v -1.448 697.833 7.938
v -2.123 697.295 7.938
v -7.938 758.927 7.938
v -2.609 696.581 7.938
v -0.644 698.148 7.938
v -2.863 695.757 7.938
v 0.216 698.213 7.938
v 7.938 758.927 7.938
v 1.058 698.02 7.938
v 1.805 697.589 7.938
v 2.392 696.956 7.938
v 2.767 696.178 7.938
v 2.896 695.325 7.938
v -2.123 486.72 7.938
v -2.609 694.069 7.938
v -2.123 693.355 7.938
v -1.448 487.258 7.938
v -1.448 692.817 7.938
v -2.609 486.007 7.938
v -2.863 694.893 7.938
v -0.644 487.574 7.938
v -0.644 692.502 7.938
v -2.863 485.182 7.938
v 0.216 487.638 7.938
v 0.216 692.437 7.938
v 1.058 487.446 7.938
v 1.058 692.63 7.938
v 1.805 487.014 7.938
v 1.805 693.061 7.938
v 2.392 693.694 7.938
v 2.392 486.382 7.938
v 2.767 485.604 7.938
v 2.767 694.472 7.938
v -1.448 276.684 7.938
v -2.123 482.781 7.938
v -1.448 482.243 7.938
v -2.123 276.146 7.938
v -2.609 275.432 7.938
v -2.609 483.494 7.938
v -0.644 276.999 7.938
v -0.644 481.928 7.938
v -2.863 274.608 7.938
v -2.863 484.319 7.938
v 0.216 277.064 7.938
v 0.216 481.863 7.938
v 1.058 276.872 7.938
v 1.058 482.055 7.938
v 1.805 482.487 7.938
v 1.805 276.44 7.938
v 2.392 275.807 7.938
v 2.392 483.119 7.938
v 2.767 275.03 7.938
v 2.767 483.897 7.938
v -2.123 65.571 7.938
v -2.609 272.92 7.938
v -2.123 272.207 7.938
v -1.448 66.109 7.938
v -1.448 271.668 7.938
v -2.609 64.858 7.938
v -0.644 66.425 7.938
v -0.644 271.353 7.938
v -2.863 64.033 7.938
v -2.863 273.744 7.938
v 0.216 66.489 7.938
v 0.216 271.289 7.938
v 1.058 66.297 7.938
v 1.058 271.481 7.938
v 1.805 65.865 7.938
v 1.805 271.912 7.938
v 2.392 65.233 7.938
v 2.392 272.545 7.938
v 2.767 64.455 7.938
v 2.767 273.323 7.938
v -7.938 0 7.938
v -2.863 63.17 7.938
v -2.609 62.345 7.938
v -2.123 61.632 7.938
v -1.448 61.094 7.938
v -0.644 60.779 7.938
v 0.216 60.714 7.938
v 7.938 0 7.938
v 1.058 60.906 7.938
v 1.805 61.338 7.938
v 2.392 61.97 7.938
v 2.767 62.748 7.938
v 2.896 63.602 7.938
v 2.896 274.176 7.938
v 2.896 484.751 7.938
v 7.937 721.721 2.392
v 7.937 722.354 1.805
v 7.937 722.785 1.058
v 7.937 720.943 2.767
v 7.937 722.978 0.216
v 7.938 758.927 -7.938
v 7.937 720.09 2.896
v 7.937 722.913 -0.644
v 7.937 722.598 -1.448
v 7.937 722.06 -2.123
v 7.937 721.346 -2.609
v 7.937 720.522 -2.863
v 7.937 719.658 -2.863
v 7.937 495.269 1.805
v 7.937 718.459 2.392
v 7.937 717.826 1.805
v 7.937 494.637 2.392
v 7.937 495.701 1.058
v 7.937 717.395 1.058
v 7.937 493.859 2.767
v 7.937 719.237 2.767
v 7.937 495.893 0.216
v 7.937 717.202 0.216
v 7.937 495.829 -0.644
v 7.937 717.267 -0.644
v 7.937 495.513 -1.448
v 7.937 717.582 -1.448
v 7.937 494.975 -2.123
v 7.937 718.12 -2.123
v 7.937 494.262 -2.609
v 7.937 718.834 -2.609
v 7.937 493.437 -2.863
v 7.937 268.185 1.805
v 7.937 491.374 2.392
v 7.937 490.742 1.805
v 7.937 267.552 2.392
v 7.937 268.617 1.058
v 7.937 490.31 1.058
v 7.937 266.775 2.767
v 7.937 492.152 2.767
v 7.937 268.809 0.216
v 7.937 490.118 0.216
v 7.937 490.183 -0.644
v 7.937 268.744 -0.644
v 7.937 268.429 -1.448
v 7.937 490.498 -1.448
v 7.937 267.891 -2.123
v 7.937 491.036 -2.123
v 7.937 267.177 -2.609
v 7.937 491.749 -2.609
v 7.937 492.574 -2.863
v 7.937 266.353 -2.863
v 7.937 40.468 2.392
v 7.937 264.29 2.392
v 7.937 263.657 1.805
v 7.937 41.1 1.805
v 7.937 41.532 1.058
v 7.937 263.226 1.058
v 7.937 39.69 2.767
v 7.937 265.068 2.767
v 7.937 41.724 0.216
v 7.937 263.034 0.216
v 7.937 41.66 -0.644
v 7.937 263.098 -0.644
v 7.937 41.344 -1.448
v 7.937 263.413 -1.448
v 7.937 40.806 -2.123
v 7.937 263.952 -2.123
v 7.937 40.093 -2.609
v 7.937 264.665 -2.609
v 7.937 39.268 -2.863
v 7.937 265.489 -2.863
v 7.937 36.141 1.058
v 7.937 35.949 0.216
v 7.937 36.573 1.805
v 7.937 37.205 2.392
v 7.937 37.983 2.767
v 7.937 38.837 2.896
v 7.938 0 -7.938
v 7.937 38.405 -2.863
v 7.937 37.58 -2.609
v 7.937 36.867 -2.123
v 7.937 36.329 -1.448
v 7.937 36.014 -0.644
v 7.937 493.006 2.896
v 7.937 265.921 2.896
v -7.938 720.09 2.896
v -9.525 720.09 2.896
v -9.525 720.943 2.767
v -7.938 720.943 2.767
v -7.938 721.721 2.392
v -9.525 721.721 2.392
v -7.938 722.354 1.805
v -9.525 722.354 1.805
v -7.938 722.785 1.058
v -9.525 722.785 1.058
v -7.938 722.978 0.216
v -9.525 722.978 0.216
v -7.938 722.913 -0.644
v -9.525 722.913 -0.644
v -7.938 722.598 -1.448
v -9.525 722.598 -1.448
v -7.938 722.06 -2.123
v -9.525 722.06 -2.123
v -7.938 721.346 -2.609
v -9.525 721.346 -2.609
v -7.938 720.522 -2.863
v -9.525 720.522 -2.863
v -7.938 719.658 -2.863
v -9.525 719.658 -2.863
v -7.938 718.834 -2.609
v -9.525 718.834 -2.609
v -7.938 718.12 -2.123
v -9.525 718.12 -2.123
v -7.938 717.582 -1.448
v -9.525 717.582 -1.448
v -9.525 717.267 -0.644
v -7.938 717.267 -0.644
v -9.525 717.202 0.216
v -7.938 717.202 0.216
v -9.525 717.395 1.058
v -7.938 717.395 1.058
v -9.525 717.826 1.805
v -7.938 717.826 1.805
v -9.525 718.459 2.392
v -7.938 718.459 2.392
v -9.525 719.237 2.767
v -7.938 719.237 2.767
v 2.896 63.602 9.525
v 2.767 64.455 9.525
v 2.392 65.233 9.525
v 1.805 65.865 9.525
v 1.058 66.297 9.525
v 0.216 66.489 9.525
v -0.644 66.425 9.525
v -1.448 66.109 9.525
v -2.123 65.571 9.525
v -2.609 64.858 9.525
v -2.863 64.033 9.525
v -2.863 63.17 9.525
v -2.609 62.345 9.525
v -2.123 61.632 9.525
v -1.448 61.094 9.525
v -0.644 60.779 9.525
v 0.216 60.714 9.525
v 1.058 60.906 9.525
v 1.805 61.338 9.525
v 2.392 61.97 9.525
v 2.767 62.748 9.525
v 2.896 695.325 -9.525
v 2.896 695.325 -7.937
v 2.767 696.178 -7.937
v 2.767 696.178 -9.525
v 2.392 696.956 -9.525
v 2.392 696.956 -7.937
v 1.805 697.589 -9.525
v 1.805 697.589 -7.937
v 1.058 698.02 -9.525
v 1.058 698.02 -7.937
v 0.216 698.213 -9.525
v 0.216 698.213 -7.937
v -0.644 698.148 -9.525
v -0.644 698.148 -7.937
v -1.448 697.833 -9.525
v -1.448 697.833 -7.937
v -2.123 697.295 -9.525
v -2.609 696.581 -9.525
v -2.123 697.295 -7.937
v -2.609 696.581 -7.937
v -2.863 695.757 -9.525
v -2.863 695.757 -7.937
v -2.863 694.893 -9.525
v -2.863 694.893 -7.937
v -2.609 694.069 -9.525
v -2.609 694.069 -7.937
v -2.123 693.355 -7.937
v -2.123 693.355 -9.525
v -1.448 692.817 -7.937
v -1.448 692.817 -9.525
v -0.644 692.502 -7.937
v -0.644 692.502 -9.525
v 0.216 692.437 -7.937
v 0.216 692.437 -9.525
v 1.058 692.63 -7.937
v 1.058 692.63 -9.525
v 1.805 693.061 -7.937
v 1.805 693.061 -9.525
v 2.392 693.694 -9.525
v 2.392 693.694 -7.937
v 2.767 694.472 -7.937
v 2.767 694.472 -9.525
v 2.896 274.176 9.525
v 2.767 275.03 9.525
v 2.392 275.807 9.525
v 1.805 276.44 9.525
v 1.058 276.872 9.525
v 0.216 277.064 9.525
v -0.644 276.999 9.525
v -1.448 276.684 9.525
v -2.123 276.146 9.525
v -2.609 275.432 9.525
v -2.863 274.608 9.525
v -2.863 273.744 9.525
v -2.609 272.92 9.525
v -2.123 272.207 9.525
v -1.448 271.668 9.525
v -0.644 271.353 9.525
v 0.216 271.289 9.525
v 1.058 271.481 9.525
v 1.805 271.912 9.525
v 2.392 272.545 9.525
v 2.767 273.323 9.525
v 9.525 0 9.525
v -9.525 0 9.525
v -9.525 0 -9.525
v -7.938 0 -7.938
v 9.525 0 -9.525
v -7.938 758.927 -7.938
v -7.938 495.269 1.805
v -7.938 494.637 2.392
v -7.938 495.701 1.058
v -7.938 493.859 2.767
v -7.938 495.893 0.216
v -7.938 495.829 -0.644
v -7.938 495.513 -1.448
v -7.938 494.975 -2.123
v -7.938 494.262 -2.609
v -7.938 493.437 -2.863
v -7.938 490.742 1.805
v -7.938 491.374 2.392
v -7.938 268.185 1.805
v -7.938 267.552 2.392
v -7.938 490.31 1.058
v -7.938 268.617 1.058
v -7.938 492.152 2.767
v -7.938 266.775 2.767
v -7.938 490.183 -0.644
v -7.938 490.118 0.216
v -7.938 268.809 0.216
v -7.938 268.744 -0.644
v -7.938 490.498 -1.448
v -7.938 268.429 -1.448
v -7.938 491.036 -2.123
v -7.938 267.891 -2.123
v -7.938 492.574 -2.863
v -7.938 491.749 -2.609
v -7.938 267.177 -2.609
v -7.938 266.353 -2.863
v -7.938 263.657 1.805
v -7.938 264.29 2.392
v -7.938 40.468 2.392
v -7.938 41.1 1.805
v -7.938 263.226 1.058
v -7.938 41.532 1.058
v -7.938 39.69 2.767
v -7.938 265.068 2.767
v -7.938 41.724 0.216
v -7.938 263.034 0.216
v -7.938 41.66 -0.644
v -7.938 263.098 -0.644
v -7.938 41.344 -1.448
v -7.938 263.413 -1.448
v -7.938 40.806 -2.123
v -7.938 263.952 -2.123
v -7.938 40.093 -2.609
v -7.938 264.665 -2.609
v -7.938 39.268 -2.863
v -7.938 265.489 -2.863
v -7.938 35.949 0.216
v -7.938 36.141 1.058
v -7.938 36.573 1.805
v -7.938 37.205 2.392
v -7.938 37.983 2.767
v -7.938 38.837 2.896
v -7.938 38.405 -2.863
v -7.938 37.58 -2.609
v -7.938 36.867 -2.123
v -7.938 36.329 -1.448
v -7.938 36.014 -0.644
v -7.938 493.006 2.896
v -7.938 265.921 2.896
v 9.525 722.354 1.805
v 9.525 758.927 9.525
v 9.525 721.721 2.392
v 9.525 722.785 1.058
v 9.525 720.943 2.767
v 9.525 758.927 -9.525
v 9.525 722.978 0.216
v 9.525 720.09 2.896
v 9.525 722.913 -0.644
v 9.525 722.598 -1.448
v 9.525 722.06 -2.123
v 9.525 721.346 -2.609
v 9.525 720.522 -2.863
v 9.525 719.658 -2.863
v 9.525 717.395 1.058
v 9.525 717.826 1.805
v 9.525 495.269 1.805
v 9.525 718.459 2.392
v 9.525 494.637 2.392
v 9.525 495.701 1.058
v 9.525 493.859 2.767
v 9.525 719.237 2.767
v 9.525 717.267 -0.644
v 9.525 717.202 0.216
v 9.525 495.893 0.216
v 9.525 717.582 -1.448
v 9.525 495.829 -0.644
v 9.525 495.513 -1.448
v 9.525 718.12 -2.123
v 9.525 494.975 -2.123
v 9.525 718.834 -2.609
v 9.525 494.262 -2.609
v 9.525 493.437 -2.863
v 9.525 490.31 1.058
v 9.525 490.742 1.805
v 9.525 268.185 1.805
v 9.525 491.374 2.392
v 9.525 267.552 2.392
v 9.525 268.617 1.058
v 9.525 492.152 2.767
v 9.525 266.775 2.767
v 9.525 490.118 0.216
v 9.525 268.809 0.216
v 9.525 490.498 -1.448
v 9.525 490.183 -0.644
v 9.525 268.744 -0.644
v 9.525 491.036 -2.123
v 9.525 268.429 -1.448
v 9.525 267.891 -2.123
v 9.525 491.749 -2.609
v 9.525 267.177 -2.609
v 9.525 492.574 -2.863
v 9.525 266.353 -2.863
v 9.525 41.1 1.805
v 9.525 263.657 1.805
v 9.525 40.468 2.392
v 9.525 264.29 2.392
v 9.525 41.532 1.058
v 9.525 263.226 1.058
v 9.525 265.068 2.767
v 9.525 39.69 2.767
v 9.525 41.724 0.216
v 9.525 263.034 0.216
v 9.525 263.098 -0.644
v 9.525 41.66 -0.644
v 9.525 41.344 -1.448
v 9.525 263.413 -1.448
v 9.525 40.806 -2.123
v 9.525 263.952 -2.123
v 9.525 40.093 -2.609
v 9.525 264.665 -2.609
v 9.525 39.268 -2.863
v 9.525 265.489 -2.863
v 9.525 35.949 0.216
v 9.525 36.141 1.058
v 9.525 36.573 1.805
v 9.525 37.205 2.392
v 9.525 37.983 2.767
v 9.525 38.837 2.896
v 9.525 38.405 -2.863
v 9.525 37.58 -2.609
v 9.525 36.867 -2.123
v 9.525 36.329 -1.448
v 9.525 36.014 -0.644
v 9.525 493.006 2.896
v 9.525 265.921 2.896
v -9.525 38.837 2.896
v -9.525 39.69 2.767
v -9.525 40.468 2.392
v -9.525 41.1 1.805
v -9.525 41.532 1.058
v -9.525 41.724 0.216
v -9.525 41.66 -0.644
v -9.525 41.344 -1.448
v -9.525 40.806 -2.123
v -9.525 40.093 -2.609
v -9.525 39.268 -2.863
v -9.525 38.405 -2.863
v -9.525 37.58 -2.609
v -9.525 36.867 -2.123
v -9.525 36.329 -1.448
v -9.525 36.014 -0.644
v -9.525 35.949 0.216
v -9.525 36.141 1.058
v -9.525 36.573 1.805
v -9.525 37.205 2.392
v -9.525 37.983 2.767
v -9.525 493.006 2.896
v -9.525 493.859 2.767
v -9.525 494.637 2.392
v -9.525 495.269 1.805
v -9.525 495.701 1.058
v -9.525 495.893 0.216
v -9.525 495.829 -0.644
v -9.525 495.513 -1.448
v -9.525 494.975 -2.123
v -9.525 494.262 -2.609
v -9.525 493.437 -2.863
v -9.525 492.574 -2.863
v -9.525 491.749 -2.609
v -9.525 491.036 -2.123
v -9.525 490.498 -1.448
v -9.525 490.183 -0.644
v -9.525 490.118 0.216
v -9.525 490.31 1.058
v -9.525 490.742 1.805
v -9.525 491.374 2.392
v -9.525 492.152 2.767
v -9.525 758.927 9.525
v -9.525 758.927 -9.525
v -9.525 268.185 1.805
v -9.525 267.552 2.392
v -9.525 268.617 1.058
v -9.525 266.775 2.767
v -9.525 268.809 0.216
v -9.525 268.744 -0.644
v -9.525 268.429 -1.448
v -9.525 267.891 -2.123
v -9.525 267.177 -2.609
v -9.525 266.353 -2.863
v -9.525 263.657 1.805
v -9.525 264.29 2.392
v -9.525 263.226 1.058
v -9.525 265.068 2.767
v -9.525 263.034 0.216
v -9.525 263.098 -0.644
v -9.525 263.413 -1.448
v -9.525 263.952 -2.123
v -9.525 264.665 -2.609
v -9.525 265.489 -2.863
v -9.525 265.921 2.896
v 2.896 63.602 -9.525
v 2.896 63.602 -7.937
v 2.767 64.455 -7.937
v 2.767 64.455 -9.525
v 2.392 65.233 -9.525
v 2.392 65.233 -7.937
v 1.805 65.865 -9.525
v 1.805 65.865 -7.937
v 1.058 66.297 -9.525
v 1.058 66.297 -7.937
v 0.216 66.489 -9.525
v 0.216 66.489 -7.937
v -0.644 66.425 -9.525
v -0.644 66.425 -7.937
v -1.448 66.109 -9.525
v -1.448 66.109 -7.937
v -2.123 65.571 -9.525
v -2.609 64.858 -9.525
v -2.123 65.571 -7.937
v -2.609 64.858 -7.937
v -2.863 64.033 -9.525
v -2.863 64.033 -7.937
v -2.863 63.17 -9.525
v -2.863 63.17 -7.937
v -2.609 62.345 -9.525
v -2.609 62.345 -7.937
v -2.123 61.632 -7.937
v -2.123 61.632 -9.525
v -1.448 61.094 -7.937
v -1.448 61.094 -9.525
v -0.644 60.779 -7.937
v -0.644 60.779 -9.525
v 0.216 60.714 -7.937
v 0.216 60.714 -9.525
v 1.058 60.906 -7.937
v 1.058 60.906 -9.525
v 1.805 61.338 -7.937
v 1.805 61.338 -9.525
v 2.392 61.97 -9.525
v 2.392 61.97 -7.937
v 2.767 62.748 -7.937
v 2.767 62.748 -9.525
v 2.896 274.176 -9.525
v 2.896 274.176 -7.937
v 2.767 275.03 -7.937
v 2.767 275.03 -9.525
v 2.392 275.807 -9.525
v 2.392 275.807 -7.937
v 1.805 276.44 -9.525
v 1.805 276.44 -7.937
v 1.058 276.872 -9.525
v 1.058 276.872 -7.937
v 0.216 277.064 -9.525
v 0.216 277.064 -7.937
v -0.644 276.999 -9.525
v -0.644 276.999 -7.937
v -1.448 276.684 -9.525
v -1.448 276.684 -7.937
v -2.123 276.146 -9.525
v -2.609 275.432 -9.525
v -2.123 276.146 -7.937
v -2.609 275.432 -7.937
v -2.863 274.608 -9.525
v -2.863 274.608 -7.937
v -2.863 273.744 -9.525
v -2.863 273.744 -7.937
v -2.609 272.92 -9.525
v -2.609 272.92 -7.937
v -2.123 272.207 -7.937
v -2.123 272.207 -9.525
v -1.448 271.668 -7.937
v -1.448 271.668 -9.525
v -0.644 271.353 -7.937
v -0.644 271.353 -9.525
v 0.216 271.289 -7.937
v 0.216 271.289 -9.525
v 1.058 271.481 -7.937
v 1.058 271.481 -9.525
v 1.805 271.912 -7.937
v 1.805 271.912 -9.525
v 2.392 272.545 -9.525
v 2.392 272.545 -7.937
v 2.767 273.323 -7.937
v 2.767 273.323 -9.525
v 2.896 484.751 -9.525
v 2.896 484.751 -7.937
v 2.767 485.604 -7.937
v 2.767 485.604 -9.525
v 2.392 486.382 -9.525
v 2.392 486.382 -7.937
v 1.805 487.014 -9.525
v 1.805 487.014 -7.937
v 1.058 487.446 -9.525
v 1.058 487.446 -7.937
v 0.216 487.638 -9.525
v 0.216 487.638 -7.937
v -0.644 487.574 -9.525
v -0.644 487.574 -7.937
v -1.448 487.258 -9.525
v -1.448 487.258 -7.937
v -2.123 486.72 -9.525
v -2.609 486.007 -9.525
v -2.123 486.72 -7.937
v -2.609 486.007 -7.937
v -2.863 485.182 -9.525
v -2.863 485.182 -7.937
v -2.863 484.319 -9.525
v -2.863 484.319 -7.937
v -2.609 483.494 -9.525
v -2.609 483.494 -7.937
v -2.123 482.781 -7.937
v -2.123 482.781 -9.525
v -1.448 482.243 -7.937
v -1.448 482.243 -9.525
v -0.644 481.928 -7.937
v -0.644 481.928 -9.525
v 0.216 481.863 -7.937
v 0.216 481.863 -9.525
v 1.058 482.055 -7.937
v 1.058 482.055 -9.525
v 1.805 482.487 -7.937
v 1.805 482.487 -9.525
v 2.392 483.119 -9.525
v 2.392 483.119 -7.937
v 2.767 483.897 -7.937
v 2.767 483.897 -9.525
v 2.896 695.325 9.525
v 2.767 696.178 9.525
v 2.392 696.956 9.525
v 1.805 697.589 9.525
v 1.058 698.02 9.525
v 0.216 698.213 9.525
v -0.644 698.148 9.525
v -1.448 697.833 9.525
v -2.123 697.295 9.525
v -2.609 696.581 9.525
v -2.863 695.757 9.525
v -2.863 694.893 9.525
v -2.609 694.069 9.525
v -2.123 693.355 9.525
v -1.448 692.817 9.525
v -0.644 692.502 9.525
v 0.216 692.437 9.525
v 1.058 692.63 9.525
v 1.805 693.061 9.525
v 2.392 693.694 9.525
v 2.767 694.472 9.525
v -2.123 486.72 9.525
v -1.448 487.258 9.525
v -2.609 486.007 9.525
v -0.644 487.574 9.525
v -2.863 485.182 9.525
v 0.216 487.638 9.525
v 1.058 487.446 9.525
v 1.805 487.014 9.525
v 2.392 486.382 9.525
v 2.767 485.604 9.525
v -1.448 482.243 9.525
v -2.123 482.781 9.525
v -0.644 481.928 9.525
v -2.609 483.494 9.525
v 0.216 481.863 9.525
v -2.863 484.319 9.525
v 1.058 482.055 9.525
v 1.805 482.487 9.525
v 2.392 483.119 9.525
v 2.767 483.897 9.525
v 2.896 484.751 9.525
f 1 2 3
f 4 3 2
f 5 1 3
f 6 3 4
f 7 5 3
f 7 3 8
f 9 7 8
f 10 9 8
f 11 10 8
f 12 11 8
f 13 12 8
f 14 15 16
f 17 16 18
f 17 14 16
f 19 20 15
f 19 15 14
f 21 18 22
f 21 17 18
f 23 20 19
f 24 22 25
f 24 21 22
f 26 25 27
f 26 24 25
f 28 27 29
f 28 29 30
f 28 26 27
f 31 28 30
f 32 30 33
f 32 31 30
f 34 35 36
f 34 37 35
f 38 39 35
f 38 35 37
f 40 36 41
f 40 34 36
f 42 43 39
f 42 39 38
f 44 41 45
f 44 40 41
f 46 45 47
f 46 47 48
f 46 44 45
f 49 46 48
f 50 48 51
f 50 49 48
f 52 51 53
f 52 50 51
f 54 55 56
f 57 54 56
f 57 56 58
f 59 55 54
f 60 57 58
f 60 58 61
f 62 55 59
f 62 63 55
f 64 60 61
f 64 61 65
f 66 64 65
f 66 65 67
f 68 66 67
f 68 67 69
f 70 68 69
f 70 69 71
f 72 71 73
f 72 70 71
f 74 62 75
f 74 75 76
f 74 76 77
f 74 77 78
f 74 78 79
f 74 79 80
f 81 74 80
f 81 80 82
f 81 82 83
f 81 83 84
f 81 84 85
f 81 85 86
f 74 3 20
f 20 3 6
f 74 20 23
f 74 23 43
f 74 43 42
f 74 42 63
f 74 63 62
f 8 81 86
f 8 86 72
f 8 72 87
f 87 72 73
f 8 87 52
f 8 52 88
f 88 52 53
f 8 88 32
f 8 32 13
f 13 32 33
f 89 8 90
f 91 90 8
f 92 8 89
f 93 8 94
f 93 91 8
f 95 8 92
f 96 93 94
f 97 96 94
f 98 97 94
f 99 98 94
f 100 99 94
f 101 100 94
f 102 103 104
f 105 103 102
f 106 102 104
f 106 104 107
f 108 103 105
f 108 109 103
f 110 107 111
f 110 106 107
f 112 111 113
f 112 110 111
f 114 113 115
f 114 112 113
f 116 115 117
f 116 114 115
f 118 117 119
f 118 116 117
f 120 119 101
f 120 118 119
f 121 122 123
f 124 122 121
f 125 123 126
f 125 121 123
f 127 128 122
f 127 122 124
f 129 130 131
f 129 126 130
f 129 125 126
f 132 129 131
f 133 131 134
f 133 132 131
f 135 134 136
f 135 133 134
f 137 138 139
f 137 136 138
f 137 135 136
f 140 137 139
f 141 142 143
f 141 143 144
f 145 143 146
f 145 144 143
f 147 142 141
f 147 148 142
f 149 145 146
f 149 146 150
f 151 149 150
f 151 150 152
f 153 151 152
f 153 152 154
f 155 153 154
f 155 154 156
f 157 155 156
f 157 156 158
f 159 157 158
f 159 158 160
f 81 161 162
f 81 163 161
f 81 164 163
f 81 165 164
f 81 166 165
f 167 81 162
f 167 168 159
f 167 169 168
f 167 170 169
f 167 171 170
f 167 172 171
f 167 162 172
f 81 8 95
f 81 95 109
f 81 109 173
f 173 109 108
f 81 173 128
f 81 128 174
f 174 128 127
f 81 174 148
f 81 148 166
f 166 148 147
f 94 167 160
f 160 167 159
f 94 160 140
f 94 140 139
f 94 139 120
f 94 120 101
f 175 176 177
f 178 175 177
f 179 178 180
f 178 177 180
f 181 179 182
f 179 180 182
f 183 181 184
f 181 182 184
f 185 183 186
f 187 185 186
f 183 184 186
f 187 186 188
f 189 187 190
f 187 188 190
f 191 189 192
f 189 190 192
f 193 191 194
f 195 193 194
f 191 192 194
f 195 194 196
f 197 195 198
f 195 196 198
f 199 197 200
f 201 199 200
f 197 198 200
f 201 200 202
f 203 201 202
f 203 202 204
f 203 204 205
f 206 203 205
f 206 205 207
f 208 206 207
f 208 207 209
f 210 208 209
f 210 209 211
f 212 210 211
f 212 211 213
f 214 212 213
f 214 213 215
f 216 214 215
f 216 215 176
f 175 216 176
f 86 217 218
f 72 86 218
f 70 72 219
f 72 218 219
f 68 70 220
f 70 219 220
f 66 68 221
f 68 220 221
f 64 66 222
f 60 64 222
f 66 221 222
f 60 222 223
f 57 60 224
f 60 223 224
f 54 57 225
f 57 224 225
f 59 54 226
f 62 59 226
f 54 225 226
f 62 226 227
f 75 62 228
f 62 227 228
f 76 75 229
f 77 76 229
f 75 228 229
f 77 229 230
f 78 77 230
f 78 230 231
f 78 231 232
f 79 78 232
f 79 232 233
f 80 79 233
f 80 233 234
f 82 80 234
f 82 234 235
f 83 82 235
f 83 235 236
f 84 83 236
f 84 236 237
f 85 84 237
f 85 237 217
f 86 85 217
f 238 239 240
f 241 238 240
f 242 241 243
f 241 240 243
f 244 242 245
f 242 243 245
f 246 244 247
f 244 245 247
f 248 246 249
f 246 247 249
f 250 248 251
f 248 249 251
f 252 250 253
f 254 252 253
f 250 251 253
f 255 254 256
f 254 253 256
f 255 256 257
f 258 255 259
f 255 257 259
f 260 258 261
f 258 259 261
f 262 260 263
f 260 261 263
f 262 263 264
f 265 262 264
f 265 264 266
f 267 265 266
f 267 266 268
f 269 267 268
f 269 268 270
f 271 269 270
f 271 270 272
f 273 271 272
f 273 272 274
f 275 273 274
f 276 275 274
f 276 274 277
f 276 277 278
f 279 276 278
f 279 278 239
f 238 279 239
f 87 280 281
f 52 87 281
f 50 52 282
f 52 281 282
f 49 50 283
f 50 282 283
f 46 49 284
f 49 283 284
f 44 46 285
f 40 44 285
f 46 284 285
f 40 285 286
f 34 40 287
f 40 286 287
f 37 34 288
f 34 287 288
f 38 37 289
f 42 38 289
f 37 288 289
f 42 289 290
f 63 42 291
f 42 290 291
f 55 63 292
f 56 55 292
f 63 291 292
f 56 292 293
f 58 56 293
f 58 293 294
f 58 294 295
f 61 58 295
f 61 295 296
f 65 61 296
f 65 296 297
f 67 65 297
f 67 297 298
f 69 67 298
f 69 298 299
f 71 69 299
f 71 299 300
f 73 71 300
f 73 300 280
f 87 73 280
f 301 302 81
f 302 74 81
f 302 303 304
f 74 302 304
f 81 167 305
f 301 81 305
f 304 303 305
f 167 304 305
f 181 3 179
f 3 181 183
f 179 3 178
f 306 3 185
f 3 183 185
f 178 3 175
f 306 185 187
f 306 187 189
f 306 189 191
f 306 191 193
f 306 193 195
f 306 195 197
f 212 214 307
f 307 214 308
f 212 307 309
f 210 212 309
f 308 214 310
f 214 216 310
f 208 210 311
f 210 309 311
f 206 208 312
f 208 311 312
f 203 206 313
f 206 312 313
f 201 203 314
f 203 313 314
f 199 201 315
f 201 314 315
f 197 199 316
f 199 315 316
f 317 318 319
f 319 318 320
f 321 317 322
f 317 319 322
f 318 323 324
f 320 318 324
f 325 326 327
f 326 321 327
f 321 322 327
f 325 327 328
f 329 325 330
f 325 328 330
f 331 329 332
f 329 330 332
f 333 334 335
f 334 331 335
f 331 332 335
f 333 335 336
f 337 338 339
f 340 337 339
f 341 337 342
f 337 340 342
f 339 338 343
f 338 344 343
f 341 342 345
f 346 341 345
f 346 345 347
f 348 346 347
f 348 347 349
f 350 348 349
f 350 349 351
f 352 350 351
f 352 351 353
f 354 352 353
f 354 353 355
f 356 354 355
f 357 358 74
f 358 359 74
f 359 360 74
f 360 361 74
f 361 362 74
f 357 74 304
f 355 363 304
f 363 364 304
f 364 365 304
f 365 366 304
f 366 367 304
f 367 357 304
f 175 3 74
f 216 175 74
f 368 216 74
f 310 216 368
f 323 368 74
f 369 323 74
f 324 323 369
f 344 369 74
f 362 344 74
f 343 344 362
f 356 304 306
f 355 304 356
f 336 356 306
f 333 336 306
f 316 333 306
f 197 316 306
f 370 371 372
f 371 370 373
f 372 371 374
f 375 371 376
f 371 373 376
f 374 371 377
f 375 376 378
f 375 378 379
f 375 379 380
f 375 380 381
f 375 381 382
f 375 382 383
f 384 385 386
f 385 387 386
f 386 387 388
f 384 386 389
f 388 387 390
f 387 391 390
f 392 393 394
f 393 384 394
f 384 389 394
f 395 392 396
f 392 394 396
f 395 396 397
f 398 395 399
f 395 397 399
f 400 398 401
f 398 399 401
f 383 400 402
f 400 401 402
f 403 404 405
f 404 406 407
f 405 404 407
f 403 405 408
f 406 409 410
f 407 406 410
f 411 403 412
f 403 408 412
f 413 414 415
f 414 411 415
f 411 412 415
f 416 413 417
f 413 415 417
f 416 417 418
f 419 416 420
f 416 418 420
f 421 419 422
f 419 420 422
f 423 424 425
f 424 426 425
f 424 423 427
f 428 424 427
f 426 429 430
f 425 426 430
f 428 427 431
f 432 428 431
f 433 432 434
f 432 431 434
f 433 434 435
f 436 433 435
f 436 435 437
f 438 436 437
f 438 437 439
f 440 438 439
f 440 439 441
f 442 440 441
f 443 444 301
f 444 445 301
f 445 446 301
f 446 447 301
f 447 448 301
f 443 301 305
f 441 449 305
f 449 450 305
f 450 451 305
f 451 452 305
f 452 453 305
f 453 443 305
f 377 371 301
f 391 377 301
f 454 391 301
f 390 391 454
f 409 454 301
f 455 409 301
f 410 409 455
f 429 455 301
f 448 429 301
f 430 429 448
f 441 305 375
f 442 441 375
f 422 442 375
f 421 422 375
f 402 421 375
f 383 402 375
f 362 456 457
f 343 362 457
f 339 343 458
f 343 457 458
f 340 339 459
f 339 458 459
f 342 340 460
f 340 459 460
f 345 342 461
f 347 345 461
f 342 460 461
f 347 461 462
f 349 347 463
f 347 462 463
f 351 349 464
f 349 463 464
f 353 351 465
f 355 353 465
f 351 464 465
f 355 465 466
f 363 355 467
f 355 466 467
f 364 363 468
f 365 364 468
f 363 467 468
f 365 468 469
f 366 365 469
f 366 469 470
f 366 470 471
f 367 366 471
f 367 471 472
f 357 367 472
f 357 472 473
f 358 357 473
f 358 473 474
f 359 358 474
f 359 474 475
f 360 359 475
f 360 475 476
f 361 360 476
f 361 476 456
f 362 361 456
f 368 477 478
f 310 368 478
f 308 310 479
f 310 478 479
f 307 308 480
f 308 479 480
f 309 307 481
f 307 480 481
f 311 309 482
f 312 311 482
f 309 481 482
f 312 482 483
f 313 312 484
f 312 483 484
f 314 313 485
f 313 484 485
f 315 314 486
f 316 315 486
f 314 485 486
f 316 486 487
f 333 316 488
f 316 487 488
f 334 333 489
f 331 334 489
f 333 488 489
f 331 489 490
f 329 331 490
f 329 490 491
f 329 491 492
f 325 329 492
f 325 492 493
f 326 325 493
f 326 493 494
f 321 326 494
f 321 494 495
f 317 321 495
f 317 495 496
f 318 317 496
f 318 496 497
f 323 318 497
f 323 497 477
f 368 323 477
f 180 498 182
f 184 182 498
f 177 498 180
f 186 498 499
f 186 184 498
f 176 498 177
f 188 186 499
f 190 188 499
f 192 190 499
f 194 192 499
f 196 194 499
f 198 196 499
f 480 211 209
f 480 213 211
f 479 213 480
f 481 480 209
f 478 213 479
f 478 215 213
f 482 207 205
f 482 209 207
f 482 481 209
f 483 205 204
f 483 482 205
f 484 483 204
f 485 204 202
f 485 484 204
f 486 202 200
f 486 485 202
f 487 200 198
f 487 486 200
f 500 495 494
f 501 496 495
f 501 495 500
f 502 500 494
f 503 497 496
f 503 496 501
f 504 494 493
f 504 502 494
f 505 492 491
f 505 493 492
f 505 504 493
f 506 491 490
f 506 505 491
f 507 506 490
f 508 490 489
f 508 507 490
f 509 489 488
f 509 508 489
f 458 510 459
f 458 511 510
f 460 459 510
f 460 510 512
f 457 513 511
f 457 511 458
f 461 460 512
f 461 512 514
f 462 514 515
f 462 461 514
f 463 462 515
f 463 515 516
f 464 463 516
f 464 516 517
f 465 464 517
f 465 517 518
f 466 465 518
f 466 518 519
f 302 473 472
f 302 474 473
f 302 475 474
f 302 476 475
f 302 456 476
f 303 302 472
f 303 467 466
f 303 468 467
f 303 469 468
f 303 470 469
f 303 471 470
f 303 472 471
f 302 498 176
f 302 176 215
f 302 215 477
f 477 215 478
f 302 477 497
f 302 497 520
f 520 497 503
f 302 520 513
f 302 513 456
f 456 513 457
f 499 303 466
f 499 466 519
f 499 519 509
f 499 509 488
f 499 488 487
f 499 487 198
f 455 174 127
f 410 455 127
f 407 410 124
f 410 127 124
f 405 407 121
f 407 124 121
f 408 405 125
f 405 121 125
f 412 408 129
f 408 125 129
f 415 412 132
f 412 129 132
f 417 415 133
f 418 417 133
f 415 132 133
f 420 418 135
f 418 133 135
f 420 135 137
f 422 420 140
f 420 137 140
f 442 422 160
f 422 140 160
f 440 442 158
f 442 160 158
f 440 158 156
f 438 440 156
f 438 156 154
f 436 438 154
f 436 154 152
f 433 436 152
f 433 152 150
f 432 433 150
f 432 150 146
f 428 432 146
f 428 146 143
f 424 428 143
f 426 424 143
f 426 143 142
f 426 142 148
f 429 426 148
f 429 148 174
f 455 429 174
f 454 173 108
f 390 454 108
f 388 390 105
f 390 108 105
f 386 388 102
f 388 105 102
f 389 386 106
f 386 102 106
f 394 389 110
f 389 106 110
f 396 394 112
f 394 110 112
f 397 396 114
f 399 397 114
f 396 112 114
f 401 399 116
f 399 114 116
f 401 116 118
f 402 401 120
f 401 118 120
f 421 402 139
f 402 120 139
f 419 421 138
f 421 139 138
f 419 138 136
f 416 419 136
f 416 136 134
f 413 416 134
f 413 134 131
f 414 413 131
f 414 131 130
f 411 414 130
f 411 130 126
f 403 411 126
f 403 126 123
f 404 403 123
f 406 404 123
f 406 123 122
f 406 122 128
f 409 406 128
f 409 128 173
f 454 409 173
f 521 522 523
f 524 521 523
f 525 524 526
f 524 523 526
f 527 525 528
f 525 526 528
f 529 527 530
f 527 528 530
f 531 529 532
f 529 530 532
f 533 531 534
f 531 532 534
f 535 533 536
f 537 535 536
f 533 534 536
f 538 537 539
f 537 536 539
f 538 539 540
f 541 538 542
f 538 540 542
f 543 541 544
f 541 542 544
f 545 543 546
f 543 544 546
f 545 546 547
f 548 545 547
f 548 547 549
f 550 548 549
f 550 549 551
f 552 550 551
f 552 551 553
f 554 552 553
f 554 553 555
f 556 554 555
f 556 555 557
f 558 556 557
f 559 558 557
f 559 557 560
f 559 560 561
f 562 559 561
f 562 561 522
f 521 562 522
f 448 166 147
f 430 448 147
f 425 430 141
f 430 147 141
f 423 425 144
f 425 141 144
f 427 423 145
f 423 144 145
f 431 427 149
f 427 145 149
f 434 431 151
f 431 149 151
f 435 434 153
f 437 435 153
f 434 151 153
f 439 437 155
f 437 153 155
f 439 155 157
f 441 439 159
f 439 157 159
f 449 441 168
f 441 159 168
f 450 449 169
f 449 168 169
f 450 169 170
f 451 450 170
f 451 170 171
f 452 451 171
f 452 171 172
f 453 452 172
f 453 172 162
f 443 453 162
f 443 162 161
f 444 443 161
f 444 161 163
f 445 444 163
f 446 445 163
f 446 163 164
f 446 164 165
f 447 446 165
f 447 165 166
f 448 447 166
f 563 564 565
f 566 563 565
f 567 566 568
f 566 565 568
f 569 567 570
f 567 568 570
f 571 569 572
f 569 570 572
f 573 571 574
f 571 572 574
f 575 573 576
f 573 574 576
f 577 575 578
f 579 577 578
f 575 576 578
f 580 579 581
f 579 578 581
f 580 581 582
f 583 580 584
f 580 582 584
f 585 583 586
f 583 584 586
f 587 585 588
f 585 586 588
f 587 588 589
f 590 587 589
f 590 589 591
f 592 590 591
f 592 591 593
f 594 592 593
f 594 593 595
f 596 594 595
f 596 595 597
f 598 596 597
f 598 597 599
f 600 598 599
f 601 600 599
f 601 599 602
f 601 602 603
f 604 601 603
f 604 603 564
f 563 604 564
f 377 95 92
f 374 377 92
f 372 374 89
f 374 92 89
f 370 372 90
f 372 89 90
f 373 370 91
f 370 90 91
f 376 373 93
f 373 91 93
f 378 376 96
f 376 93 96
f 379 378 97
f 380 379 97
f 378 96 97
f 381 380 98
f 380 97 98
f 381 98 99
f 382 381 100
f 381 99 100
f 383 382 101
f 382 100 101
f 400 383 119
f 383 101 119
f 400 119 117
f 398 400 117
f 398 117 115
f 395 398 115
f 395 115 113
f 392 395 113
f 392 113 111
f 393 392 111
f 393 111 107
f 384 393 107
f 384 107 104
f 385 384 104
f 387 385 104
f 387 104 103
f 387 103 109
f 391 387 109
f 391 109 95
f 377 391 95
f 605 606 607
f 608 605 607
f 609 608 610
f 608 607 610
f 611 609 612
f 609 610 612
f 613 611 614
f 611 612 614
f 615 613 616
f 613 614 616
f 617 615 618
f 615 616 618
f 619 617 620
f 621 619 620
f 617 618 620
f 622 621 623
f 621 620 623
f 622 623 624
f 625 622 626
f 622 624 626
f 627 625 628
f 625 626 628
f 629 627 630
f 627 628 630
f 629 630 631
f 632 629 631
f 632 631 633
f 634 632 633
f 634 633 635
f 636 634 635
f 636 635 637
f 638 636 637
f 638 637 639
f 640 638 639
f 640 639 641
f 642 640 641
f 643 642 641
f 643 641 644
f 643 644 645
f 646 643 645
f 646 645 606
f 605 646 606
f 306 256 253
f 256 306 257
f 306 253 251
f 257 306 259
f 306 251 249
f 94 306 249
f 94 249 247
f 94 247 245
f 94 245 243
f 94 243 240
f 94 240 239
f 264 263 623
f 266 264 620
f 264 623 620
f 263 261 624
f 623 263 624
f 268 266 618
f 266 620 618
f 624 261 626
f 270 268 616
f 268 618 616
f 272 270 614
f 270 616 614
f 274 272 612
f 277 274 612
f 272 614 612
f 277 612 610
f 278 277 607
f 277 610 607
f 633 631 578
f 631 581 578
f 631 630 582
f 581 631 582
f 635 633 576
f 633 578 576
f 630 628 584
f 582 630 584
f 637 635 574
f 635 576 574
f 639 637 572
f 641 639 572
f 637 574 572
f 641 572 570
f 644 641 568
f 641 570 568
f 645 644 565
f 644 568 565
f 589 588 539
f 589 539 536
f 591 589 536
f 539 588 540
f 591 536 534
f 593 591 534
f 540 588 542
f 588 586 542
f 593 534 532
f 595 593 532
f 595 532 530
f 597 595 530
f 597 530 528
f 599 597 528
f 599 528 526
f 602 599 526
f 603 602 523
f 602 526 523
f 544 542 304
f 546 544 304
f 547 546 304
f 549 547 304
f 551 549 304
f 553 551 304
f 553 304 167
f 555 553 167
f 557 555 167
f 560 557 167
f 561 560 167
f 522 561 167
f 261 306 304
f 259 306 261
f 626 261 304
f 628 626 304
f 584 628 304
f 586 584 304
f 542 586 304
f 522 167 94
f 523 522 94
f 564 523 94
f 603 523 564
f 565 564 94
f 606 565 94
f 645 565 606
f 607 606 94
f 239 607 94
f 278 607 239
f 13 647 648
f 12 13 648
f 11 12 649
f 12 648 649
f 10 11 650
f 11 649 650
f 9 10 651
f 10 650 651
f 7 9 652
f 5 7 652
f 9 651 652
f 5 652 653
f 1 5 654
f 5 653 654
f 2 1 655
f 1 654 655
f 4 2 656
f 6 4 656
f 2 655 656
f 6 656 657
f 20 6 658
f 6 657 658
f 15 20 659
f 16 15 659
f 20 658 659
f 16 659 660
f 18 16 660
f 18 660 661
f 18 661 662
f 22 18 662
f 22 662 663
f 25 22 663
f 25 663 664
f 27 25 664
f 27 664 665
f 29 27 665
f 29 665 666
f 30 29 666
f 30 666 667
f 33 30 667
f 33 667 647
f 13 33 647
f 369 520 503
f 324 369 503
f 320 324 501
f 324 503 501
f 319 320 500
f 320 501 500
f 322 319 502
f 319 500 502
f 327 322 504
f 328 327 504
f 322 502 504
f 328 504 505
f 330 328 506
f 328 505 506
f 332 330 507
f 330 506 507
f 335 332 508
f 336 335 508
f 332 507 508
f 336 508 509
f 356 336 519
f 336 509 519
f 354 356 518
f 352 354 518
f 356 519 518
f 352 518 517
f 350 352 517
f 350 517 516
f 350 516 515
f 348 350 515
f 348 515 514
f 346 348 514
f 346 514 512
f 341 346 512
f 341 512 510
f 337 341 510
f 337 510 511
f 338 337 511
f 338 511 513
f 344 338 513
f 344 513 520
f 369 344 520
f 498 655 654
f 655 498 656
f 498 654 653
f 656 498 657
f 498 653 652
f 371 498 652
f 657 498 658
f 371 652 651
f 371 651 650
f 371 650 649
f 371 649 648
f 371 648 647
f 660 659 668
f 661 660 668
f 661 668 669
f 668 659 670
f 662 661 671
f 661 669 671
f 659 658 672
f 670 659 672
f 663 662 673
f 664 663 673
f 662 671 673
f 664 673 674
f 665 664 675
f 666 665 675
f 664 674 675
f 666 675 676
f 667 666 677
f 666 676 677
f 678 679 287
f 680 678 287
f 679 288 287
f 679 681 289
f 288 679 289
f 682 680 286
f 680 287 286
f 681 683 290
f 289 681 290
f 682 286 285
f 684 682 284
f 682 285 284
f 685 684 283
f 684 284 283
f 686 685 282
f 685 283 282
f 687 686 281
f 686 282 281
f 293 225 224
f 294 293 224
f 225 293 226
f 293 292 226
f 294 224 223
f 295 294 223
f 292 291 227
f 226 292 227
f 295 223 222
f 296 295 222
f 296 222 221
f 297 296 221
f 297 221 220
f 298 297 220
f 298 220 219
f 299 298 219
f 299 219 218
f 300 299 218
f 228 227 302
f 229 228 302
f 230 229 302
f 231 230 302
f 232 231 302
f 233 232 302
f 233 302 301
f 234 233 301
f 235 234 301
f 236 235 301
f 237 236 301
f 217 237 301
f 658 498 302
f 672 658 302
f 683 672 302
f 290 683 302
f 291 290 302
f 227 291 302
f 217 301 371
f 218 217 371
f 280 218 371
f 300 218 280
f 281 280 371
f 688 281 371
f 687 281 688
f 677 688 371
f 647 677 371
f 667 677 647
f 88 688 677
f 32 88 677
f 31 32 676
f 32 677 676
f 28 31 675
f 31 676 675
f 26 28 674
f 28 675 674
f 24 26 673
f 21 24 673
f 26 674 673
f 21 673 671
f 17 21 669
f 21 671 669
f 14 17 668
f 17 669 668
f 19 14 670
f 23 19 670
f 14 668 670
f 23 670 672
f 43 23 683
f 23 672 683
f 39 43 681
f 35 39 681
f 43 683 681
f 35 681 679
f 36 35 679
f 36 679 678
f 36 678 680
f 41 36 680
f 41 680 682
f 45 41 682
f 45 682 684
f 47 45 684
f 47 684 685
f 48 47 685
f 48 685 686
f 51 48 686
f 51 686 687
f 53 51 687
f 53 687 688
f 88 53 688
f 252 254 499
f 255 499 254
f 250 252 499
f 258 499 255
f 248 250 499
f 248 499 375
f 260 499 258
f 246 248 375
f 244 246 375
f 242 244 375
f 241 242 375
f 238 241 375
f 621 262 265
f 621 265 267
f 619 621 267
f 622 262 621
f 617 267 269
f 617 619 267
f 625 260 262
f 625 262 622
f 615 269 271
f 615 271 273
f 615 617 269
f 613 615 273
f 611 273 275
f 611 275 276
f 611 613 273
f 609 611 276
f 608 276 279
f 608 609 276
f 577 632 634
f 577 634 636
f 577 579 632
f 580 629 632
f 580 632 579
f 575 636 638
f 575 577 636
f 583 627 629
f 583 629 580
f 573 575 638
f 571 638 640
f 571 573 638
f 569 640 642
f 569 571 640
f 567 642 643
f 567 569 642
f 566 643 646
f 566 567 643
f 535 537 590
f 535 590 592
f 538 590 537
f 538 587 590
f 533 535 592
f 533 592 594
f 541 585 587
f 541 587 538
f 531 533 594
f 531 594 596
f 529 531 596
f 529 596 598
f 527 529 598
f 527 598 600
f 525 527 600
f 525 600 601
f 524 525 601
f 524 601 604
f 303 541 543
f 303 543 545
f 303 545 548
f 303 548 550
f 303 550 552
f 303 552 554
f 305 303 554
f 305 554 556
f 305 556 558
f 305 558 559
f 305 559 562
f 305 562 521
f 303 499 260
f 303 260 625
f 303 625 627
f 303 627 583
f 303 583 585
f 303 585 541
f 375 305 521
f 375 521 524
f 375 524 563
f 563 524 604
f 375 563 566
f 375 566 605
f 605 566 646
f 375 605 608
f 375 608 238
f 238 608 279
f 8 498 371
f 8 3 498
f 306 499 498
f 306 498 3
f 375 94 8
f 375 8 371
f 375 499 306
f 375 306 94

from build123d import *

# Parameters (mm, degrees)
SKETCH1_W             = 19.05
SKETCH1_H             = 19.05
SKETCH1_W_2           = 15.875
SKETCH1_H_2           = 15.875
TUBE_DEPTH            = 758.9266
SKETCH2_R             = 2.8956
SIDE_WALL_HOLES_DEPTH = 20.05
LPATTERN1_COUNT       = 4
LPATTERN1_PITCH       = 210.574466667
SKETCH3_R             = 2.8956
REARWALLHOLES_DEPTH   = 20.05
LPATTERN2_COUNT       = 4
LPATTERN2_PITCH       = 227.084466667


with BuildPart() as part:
    # Sketch1 → Tube (new body)
    with BuildSketch(Plane(origin=(0, 0, 0), x_dir=(1, 0, 0), z_dir=(0, 1, 0))):
        Rectangle(SKETCH1_W, SKETCH1_H)
        Rectangle(SKETCH1_W_2, SKETCH1_H_2, mode=Mode.SUBTRACT)
    extrude(amount=TUBE_DEPTH)

    # Sketch2 → Side Wall Holes (cut, through all)
    with BuildSketch(Plane.XY.offset(9.525)):
        with Locations((0, 695.325)):
            Circle(SKETCH2_R)
    side_wall_holes = extrude(amount=-SIDE_WALL_HOLES_DEPTH, mode=Mode.SUBTRACT)

    # LPattern1: Side Wall Holes ×4
    with Locations(*[(0, -i * LPATTERN1_PITCH, 0) for i in range(1, LPATTERN1_COUNT)]):
        add(side_wall_holes, mode=Mode.SUBTRACT)

    # Sketch3 → RearWallHoles (cut, through all)
    with BuildSketch(Plane.ZY.offset(9.525)):
        with Locations((0, 720.09)):
            Circle(SKETCH3_R)
    rearwallholes = extrude(amount=-REARWALLHOLES_DEPTH, mode=Mode.SUBTRACT)

    # LPattern2: RearWallHoles ×4
    with Locations(*[(0, -i * LPATTERN2_PITCH, 0) for i in range(1, LPATTERN2_COUNT)]):
        add(rearwallholes, mode=Mode.SUBTRACT)


solid = part.part
